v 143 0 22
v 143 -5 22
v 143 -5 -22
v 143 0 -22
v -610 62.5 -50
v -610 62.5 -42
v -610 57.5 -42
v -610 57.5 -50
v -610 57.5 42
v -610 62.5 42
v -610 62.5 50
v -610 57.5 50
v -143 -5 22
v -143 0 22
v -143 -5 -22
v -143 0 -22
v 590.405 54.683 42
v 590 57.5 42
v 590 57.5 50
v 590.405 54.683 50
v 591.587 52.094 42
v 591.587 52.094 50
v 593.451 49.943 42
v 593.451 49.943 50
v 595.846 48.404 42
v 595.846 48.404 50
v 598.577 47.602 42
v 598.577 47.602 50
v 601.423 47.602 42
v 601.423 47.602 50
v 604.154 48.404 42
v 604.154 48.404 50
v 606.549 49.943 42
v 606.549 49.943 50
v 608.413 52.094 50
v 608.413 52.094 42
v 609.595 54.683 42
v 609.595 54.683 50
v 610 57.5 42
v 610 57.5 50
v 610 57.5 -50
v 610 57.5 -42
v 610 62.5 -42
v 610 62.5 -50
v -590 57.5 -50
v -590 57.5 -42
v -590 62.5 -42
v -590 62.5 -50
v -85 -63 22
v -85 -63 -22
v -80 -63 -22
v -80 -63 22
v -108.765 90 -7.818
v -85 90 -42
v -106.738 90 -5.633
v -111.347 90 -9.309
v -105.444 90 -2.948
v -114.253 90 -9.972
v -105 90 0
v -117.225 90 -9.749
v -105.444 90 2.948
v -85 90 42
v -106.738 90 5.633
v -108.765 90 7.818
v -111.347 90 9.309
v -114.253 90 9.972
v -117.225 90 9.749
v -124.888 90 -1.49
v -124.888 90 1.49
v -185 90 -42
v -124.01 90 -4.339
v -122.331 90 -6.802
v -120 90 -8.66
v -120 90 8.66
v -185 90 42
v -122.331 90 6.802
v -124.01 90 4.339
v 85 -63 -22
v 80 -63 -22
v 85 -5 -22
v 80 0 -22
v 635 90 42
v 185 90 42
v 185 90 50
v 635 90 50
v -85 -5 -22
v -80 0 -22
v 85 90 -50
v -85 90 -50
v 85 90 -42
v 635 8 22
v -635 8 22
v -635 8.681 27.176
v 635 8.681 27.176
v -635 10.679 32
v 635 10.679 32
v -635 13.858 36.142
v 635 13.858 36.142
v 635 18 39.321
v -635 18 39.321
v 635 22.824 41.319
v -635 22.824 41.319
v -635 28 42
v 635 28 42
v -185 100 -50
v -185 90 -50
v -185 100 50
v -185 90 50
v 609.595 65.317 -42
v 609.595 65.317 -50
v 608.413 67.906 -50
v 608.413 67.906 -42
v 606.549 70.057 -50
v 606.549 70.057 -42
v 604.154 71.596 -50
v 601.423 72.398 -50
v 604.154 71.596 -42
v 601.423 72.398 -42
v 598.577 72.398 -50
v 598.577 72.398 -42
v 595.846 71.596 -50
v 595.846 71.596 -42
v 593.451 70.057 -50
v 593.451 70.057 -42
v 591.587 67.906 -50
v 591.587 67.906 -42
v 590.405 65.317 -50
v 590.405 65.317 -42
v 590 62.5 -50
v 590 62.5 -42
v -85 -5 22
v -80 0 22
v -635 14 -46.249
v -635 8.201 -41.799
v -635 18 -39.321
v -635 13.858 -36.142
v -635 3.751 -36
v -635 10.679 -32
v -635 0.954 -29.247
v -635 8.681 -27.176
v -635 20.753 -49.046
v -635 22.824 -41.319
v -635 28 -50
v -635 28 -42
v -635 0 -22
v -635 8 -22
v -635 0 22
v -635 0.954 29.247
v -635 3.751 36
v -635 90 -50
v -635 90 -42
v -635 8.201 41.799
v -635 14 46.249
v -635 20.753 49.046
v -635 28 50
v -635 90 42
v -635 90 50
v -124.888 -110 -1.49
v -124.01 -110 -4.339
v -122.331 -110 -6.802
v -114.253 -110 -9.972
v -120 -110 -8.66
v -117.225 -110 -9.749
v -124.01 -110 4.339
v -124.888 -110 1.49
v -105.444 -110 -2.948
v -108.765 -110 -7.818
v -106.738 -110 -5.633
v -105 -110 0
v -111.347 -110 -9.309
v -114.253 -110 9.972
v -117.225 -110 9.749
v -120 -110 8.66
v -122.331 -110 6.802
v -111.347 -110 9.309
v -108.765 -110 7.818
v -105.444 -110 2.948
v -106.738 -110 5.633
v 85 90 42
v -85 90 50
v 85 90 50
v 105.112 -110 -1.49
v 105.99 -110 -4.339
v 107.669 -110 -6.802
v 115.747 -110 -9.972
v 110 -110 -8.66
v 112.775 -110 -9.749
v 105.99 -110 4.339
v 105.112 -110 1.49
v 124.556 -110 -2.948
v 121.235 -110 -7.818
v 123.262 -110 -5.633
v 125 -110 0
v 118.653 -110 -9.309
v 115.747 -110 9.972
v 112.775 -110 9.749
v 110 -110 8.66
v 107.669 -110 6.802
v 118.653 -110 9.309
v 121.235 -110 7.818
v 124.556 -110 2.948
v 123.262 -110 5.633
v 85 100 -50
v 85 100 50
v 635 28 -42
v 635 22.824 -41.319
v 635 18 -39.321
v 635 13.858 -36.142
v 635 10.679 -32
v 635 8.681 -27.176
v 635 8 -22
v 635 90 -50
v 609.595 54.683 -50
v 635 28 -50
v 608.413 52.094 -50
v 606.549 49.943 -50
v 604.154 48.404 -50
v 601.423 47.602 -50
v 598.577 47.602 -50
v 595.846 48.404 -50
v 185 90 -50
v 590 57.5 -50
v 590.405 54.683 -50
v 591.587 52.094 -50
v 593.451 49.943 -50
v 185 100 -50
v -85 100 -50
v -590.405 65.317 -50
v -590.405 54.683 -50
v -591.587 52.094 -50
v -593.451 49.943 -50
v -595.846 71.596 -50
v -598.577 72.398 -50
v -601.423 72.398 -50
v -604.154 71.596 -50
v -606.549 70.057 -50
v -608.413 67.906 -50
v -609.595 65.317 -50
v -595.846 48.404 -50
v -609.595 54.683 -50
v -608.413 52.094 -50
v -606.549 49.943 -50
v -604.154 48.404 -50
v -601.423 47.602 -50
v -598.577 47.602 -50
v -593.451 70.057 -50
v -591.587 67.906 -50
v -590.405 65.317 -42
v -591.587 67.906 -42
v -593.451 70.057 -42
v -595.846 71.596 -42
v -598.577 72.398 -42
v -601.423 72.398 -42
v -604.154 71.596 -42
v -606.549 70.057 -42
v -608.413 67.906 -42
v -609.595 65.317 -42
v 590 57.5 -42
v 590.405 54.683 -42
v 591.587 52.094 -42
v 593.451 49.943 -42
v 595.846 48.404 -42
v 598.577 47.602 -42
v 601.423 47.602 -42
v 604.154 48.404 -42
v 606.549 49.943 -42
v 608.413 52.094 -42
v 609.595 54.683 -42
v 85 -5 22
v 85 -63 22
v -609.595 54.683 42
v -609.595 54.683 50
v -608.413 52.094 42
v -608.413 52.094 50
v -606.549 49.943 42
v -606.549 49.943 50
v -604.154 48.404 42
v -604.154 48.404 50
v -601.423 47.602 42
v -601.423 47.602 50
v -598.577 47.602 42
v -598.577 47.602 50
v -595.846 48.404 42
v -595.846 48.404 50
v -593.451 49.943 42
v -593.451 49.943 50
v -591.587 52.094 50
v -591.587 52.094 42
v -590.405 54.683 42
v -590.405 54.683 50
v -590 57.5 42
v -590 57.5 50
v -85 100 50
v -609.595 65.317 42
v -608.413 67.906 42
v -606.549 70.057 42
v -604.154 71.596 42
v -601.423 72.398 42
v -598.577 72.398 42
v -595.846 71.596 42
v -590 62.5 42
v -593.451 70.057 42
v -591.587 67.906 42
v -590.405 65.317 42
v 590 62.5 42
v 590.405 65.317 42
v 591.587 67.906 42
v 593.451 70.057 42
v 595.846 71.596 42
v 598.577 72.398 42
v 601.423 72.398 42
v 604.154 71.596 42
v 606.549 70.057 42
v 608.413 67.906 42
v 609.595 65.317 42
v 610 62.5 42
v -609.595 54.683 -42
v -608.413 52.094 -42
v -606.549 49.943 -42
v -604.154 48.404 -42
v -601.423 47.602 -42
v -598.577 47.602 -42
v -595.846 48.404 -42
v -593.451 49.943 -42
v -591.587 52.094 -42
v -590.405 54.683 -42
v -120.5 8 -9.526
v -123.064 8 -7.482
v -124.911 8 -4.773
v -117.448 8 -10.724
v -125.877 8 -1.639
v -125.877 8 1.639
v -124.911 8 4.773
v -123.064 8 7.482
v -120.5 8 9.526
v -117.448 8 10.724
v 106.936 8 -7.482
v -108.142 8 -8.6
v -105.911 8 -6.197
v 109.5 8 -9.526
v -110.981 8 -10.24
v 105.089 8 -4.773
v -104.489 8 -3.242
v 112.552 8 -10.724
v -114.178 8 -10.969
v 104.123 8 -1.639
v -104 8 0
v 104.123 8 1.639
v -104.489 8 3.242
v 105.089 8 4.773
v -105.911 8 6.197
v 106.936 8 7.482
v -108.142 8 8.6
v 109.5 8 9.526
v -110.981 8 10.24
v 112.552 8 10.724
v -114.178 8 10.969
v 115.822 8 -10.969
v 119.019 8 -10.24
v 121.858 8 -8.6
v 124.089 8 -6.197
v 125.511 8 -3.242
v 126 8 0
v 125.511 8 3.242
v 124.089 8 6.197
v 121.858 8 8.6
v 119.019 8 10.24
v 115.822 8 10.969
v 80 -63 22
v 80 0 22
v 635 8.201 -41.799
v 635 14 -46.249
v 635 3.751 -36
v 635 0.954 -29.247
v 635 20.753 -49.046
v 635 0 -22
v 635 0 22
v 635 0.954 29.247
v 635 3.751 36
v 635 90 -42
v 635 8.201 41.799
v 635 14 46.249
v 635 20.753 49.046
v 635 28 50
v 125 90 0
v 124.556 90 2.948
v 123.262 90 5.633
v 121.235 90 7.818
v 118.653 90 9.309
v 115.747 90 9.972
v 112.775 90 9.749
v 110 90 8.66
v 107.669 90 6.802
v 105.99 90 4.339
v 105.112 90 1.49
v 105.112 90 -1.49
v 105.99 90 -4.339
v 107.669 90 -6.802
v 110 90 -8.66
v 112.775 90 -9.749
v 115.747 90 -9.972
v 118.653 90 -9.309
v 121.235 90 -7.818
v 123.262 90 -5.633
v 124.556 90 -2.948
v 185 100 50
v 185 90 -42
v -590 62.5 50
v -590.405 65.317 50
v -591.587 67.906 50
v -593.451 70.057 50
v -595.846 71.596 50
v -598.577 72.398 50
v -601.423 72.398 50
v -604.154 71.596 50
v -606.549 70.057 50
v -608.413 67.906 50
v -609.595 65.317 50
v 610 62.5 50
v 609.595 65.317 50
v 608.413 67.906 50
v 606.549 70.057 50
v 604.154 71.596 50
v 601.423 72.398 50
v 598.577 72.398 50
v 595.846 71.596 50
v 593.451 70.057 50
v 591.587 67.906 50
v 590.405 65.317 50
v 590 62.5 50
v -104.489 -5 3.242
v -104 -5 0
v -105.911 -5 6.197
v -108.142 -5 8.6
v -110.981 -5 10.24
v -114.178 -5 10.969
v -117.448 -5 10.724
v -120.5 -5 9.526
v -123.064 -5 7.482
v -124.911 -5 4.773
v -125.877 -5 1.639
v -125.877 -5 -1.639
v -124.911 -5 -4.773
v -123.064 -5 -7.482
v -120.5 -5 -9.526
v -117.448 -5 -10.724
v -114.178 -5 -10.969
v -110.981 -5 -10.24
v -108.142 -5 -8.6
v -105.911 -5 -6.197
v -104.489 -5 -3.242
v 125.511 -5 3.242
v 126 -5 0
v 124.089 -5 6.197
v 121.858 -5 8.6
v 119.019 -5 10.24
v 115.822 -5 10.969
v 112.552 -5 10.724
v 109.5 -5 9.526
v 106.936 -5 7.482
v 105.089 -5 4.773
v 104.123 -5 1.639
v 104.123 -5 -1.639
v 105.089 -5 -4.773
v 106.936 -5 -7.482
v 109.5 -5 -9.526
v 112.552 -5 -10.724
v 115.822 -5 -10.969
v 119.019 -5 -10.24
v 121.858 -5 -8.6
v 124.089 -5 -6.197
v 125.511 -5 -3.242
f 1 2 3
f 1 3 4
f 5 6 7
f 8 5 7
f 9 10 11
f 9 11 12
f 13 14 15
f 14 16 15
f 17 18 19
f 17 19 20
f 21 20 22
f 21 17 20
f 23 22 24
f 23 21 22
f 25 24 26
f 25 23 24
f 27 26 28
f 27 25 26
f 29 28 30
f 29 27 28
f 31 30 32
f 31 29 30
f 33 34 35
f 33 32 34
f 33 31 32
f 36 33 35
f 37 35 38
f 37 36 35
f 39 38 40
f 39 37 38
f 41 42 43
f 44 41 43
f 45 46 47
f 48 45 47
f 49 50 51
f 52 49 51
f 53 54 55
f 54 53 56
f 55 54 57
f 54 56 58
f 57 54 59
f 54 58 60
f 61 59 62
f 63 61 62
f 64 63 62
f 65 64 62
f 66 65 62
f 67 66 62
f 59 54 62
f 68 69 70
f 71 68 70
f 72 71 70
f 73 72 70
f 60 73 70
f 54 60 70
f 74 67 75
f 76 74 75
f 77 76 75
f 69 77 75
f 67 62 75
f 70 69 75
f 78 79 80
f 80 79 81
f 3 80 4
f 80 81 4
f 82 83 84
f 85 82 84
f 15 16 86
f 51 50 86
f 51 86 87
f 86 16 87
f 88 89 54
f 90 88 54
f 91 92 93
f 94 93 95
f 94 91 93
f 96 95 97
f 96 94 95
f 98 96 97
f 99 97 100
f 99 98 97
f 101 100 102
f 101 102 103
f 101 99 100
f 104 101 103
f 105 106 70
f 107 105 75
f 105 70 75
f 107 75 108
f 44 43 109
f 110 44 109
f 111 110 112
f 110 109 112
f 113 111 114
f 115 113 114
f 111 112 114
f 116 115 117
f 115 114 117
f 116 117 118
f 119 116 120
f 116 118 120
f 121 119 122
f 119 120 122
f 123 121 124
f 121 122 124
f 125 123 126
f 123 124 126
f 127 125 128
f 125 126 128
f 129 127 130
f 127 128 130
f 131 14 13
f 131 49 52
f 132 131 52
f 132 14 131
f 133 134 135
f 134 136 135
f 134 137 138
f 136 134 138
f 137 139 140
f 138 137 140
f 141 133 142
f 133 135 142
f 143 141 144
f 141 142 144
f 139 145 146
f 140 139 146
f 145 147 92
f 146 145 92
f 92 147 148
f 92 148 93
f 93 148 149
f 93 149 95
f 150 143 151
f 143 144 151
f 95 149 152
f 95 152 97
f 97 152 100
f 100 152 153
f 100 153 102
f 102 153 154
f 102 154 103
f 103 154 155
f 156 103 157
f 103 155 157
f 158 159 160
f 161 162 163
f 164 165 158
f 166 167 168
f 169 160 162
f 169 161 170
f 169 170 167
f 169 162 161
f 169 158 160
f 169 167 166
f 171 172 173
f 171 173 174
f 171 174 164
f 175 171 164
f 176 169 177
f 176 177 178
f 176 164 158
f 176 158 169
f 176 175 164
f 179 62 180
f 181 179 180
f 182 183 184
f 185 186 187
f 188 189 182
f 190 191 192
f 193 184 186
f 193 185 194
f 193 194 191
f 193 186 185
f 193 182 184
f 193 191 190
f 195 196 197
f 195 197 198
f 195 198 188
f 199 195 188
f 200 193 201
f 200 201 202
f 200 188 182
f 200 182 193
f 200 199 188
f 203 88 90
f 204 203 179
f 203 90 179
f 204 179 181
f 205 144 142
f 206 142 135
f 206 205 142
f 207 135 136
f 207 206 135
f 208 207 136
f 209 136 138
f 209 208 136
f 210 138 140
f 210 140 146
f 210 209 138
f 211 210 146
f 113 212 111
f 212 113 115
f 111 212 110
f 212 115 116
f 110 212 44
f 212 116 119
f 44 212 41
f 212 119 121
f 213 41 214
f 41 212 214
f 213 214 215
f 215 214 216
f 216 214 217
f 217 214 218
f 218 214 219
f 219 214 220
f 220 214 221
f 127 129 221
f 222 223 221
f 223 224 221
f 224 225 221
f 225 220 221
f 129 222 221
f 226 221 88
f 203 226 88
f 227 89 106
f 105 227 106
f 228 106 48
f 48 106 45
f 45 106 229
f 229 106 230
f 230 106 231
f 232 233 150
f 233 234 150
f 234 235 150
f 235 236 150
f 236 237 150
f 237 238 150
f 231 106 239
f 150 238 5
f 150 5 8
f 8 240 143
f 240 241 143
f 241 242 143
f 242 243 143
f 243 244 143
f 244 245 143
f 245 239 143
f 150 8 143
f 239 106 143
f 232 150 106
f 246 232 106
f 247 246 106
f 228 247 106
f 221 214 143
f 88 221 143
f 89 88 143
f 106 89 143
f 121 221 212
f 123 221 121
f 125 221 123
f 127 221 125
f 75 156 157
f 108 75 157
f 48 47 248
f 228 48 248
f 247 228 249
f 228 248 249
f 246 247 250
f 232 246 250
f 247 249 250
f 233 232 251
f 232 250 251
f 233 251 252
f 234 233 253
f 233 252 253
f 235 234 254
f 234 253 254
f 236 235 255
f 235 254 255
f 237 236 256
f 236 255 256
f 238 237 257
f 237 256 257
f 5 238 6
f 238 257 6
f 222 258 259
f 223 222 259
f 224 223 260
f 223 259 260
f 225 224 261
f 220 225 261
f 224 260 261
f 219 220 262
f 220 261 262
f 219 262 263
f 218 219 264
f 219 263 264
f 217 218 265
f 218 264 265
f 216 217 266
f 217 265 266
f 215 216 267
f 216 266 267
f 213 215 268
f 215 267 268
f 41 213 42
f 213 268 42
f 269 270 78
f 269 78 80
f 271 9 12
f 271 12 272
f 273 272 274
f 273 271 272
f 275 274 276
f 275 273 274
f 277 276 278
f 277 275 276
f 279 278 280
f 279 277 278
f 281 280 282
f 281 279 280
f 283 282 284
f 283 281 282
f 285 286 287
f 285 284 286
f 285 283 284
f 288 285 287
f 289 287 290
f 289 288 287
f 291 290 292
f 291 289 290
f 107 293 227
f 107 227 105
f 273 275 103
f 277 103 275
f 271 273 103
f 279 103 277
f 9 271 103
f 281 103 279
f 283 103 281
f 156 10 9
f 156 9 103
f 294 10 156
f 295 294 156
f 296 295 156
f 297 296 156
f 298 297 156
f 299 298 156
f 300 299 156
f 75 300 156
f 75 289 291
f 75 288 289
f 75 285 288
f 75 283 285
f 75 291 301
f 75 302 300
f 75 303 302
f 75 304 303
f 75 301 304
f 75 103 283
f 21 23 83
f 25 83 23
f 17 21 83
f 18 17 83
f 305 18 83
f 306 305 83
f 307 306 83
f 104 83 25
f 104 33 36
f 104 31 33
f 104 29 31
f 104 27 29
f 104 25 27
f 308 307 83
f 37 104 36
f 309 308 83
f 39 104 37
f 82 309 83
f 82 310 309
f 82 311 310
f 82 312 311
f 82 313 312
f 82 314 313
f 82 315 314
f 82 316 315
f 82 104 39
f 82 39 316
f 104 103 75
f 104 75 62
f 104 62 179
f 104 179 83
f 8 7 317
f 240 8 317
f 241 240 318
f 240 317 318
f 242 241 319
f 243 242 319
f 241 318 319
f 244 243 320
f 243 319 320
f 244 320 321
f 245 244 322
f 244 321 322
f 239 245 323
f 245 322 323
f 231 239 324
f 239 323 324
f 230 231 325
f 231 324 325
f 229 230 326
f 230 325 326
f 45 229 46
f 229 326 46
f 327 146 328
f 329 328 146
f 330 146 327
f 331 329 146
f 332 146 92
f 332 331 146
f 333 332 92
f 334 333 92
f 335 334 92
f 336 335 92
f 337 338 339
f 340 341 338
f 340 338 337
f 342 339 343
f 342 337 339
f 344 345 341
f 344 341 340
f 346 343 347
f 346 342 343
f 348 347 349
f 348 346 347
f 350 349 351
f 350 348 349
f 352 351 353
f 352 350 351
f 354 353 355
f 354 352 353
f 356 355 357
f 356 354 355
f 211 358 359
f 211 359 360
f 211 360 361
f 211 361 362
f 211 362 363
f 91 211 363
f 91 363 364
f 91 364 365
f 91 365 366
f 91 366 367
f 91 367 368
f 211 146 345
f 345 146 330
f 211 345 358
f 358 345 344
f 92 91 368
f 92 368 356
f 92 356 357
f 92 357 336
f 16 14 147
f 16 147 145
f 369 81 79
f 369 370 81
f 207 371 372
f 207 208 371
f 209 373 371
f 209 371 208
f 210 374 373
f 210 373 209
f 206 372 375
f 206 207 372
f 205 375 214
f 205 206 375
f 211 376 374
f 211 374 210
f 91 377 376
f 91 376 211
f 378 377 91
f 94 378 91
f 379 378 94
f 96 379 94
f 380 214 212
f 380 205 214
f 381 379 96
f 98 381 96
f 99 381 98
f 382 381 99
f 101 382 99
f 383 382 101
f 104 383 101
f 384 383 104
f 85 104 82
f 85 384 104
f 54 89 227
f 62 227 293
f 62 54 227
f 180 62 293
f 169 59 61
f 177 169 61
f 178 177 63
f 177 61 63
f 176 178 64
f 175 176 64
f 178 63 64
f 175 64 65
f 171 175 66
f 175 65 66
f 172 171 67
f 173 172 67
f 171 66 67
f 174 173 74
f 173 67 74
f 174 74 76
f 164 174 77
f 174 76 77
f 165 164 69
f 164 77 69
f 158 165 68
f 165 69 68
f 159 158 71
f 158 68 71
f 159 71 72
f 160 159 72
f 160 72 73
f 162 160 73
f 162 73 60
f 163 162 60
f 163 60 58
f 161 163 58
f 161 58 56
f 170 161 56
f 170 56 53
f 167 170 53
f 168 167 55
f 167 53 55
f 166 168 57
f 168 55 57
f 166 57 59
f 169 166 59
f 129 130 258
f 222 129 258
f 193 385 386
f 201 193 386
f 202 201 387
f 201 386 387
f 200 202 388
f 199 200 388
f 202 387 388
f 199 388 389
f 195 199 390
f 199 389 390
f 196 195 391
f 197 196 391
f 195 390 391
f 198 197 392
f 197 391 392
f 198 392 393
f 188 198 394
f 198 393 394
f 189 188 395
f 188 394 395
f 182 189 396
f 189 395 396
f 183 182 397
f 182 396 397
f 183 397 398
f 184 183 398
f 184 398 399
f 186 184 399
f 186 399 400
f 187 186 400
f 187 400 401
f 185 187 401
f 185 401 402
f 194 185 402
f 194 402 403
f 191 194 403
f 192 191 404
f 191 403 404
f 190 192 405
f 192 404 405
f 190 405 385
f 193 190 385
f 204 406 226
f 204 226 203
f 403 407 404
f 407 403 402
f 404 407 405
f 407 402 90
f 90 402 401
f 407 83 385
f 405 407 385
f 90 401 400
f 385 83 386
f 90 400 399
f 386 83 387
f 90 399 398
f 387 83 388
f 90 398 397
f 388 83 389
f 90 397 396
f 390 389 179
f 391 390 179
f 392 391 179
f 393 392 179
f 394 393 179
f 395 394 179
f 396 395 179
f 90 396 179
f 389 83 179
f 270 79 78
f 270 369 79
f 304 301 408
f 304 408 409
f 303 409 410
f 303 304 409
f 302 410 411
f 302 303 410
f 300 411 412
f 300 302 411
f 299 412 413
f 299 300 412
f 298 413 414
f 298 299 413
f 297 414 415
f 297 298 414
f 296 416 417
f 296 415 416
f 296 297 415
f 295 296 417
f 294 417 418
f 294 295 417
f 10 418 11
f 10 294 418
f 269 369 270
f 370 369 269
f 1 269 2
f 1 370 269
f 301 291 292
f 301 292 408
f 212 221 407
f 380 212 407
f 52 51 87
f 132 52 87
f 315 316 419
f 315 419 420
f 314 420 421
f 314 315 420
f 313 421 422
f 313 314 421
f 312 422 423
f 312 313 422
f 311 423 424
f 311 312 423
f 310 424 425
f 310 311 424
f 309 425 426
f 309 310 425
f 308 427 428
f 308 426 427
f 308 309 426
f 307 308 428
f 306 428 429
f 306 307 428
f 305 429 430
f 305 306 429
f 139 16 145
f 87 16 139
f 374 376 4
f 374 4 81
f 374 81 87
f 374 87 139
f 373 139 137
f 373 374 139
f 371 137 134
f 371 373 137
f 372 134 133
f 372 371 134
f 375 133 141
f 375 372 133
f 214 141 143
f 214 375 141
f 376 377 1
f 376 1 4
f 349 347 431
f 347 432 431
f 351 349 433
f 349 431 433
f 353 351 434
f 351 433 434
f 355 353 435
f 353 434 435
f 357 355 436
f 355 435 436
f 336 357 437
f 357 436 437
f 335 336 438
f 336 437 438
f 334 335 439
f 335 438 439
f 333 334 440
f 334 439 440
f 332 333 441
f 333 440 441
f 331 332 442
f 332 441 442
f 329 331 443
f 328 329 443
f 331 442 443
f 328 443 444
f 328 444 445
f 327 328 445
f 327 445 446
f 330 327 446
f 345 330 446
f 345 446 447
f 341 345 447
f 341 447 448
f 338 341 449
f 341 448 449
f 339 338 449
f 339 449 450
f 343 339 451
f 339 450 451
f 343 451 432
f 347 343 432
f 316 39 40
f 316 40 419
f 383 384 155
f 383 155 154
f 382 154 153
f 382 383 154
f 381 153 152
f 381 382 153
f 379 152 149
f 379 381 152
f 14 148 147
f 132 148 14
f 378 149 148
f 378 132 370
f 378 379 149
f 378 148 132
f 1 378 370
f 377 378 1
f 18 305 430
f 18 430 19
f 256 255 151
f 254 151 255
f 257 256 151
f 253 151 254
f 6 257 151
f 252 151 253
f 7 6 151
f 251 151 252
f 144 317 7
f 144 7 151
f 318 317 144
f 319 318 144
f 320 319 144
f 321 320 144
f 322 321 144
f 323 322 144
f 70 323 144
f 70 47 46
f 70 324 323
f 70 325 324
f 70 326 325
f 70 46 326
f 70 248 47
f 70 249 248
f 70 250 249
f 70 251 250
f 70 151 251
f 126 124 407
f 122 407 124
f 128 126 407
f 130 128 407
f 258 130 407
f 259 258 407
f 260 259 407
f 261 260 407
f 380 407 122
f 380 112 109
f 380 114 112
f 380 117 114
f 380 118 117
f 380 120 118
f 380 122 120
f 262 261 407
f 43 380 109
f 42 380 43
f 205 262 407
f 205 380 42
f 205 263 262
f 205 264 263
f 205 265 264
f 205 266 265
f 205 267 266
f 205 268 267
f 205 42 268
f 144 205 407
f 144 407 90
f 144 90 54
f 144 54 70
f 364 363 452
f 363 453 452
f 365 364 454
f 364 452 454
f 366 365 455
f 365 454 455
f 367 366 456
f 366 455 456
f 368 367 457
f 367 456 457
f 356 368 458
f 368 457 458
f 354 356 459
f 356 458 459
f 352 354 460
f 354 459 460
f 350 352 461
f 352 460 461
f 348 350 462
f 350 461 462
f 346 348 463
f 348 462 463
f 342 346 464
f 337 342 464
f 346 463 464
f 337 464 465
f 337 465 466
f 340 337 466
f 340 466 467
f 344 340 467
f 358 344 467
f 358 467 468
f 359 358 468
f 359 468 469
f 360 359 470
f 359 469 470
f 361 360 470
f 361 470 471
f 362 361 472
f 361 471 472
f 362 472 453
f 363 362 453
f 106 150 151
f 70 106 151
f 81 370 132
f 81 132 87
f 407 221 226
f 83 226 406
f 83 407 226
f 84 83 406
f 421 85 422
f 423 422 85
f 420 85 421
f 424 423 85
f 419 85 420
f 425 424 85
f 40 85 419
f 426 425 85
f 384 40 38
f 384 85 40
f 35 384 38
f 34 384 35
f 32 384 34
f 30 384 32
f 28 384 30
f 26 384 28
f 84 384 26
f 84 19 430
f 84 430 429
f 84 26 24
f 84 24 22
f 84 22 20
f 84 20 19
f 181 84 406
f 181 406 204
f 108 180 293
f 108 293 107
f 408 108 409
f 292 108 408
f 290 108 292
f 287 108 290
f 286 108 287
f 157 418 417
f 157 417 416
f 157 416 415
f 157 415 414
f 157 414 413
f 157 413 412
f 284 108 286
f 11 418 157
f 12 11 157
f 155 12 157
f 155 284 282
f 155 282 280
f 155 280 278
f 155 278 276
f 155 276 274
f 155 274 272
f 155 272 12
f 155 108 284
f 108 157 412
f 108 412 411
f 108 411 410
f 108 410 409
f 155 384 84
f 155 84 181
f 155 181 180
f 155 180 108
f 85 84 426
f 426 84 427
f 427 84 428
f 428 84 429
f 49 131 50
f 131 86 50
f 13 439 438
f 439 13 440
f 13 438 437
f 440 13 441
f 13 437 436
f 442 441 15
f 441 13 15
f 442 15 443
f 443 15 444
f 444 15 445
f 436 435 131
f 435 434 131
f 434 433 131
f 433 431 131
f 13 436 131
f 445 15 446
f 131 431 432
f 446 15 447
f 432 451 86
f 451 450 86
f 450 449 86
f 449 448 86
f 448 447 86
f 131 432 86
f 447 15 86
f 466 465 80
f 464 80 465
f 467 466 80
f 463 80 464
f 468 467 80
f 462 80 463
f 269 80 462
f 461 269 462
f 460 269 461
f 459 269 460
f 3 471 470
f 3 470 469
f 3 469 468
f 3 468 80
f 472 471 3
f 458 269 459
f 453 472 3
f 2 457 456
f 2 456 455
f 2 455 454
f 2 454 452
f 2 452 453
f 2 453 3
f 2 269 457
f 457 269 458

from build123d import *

# Parameters (mm, degrees)
F1_DEPTH      = 635
F3_DEPTH      = 22
F4_W          = 100
F4_H          = 100
F5_DEPTH      = 10
F6_R          = 11
F7_DEPTH      = 8
F7_DEPTH_BACK = 63.001
F9_DEPTH      = 50.001
F9_DEPTH_BACK = 50.001
F10_R         = 10
F11_DEPTH     = 200


with BuildPart() as f1:
    # F0 (on Right) → F1 (new body, symmetric)
    with BuildSketch(Plane.YZ):
        with BuildLine():
            Line((90, 42), (90, 50))
            Line((90, 50), (28, 50))
            ThreePointArc((28, 50), (8.2010101268, 41.7989898732), (0, 22))
            Line((0, 22), (0, -22))
            ThreePointArc((0, -22), (8.2010101268, -41.7989898732), (28, -50))
            Line((28, -50), (90, -50))
            Line((90, -50), (90, -42))
            Line((90, -42), (28, -42))
            ThreePointArc((28, -42), (13.8578643763, -36.1421356237), (8, -22))
            Line((8, -22), (8, 22))
            ThreePointArc((8, 22), (13.8578643763, 36.1421356237), (28, 42))
            Line((28, 42), (90, 42))
        make_face()
    extrude(amount=F1_DEPTH, both=True)

    # F2 (on Top) → F3 (join, symmetric)
    with BuildSketch(Plane.XY):
        Polygon((-80, 0), (-143, 0), (-143, -5), (-85, -5), (-85, -63), (-80, -63), align=None)
        Polygon((80, -63), (85, -63), (85, -5), (143, -5), (143, 0), (80, 0), align=None)
    extrude(amount=F3_DEPTH, both=True)

    # F4 (on face) → F5 (join)
    with BuildSketch(Plane(origin=(0, 90, 0), x_dir=(-1, 0, 0), z_dir=(0, 1, 0))):
        with Locations((-135, 0)):
            Rectangle(F4_W, F4_H)
        with Locations((135, 0)):
            Rectangle(F4_W, F4_H)
    extrude(amount=F5_DEPTH)

    # F6 (on Front) → F7 (cut, two sides)
    with BuildSketch(Plane.XZ) as f7_sk:
        with Locations((-115, 0)):
            Circle(F6_R)
        with Locations((115, 0)):
            Circle(F6_R)
    extrude(amount=-F7_DEPTH, mode=Mode.SUBTRACT)
    extrude(f7_sk.sketch, amount=F7_DEPTH_BACK, mode=Mode.SUBTRACT)

    # F8 (on Top) → F9 (cut, two sides)
    with BuildSketch(Plane.XY) as f9_sk:
        with BuildLine():
            Line((-590, 57.5), (-590, 62.5))
            ThreePointArc((-590, 62.5), (-600, 72.5), (-610, 62.5))
            Line((-610, 62.5), (-610, 57.5))
            ThreePointArc((-610, 57.5), (-600, 47.5), (-590, 57.5))
        make_face()
        with BuildLine():
            ThreePointArc((610, 62.5), (600, 72.5), (590, 62.5))
            Line((590, 62.5), (590, 57.5))
            ThreePointArc((590, 57.5), (600, 47.5), (610, 57.5))
            Line((610, 57.5), (610, 62.5))
        make_face()
    extrude(amount=F9_DEPTH, mode=Mode.SUBTRACT)
    extrude(f9_sk.sketch, amount=-F9_DEPTH_BACK, mode=Mode.SUBTRACT)

    # F10 (on face) → F11 (join)
    with BuildSketch(Plane.XZ.offset(-90)):
        with Locations((-115, 0)):
            Circle(F10_R)
        with Locations((115, 0)):
            Circle(F10_R)
    extrude(amount=F11_DEPTH)


solid = f1.part
